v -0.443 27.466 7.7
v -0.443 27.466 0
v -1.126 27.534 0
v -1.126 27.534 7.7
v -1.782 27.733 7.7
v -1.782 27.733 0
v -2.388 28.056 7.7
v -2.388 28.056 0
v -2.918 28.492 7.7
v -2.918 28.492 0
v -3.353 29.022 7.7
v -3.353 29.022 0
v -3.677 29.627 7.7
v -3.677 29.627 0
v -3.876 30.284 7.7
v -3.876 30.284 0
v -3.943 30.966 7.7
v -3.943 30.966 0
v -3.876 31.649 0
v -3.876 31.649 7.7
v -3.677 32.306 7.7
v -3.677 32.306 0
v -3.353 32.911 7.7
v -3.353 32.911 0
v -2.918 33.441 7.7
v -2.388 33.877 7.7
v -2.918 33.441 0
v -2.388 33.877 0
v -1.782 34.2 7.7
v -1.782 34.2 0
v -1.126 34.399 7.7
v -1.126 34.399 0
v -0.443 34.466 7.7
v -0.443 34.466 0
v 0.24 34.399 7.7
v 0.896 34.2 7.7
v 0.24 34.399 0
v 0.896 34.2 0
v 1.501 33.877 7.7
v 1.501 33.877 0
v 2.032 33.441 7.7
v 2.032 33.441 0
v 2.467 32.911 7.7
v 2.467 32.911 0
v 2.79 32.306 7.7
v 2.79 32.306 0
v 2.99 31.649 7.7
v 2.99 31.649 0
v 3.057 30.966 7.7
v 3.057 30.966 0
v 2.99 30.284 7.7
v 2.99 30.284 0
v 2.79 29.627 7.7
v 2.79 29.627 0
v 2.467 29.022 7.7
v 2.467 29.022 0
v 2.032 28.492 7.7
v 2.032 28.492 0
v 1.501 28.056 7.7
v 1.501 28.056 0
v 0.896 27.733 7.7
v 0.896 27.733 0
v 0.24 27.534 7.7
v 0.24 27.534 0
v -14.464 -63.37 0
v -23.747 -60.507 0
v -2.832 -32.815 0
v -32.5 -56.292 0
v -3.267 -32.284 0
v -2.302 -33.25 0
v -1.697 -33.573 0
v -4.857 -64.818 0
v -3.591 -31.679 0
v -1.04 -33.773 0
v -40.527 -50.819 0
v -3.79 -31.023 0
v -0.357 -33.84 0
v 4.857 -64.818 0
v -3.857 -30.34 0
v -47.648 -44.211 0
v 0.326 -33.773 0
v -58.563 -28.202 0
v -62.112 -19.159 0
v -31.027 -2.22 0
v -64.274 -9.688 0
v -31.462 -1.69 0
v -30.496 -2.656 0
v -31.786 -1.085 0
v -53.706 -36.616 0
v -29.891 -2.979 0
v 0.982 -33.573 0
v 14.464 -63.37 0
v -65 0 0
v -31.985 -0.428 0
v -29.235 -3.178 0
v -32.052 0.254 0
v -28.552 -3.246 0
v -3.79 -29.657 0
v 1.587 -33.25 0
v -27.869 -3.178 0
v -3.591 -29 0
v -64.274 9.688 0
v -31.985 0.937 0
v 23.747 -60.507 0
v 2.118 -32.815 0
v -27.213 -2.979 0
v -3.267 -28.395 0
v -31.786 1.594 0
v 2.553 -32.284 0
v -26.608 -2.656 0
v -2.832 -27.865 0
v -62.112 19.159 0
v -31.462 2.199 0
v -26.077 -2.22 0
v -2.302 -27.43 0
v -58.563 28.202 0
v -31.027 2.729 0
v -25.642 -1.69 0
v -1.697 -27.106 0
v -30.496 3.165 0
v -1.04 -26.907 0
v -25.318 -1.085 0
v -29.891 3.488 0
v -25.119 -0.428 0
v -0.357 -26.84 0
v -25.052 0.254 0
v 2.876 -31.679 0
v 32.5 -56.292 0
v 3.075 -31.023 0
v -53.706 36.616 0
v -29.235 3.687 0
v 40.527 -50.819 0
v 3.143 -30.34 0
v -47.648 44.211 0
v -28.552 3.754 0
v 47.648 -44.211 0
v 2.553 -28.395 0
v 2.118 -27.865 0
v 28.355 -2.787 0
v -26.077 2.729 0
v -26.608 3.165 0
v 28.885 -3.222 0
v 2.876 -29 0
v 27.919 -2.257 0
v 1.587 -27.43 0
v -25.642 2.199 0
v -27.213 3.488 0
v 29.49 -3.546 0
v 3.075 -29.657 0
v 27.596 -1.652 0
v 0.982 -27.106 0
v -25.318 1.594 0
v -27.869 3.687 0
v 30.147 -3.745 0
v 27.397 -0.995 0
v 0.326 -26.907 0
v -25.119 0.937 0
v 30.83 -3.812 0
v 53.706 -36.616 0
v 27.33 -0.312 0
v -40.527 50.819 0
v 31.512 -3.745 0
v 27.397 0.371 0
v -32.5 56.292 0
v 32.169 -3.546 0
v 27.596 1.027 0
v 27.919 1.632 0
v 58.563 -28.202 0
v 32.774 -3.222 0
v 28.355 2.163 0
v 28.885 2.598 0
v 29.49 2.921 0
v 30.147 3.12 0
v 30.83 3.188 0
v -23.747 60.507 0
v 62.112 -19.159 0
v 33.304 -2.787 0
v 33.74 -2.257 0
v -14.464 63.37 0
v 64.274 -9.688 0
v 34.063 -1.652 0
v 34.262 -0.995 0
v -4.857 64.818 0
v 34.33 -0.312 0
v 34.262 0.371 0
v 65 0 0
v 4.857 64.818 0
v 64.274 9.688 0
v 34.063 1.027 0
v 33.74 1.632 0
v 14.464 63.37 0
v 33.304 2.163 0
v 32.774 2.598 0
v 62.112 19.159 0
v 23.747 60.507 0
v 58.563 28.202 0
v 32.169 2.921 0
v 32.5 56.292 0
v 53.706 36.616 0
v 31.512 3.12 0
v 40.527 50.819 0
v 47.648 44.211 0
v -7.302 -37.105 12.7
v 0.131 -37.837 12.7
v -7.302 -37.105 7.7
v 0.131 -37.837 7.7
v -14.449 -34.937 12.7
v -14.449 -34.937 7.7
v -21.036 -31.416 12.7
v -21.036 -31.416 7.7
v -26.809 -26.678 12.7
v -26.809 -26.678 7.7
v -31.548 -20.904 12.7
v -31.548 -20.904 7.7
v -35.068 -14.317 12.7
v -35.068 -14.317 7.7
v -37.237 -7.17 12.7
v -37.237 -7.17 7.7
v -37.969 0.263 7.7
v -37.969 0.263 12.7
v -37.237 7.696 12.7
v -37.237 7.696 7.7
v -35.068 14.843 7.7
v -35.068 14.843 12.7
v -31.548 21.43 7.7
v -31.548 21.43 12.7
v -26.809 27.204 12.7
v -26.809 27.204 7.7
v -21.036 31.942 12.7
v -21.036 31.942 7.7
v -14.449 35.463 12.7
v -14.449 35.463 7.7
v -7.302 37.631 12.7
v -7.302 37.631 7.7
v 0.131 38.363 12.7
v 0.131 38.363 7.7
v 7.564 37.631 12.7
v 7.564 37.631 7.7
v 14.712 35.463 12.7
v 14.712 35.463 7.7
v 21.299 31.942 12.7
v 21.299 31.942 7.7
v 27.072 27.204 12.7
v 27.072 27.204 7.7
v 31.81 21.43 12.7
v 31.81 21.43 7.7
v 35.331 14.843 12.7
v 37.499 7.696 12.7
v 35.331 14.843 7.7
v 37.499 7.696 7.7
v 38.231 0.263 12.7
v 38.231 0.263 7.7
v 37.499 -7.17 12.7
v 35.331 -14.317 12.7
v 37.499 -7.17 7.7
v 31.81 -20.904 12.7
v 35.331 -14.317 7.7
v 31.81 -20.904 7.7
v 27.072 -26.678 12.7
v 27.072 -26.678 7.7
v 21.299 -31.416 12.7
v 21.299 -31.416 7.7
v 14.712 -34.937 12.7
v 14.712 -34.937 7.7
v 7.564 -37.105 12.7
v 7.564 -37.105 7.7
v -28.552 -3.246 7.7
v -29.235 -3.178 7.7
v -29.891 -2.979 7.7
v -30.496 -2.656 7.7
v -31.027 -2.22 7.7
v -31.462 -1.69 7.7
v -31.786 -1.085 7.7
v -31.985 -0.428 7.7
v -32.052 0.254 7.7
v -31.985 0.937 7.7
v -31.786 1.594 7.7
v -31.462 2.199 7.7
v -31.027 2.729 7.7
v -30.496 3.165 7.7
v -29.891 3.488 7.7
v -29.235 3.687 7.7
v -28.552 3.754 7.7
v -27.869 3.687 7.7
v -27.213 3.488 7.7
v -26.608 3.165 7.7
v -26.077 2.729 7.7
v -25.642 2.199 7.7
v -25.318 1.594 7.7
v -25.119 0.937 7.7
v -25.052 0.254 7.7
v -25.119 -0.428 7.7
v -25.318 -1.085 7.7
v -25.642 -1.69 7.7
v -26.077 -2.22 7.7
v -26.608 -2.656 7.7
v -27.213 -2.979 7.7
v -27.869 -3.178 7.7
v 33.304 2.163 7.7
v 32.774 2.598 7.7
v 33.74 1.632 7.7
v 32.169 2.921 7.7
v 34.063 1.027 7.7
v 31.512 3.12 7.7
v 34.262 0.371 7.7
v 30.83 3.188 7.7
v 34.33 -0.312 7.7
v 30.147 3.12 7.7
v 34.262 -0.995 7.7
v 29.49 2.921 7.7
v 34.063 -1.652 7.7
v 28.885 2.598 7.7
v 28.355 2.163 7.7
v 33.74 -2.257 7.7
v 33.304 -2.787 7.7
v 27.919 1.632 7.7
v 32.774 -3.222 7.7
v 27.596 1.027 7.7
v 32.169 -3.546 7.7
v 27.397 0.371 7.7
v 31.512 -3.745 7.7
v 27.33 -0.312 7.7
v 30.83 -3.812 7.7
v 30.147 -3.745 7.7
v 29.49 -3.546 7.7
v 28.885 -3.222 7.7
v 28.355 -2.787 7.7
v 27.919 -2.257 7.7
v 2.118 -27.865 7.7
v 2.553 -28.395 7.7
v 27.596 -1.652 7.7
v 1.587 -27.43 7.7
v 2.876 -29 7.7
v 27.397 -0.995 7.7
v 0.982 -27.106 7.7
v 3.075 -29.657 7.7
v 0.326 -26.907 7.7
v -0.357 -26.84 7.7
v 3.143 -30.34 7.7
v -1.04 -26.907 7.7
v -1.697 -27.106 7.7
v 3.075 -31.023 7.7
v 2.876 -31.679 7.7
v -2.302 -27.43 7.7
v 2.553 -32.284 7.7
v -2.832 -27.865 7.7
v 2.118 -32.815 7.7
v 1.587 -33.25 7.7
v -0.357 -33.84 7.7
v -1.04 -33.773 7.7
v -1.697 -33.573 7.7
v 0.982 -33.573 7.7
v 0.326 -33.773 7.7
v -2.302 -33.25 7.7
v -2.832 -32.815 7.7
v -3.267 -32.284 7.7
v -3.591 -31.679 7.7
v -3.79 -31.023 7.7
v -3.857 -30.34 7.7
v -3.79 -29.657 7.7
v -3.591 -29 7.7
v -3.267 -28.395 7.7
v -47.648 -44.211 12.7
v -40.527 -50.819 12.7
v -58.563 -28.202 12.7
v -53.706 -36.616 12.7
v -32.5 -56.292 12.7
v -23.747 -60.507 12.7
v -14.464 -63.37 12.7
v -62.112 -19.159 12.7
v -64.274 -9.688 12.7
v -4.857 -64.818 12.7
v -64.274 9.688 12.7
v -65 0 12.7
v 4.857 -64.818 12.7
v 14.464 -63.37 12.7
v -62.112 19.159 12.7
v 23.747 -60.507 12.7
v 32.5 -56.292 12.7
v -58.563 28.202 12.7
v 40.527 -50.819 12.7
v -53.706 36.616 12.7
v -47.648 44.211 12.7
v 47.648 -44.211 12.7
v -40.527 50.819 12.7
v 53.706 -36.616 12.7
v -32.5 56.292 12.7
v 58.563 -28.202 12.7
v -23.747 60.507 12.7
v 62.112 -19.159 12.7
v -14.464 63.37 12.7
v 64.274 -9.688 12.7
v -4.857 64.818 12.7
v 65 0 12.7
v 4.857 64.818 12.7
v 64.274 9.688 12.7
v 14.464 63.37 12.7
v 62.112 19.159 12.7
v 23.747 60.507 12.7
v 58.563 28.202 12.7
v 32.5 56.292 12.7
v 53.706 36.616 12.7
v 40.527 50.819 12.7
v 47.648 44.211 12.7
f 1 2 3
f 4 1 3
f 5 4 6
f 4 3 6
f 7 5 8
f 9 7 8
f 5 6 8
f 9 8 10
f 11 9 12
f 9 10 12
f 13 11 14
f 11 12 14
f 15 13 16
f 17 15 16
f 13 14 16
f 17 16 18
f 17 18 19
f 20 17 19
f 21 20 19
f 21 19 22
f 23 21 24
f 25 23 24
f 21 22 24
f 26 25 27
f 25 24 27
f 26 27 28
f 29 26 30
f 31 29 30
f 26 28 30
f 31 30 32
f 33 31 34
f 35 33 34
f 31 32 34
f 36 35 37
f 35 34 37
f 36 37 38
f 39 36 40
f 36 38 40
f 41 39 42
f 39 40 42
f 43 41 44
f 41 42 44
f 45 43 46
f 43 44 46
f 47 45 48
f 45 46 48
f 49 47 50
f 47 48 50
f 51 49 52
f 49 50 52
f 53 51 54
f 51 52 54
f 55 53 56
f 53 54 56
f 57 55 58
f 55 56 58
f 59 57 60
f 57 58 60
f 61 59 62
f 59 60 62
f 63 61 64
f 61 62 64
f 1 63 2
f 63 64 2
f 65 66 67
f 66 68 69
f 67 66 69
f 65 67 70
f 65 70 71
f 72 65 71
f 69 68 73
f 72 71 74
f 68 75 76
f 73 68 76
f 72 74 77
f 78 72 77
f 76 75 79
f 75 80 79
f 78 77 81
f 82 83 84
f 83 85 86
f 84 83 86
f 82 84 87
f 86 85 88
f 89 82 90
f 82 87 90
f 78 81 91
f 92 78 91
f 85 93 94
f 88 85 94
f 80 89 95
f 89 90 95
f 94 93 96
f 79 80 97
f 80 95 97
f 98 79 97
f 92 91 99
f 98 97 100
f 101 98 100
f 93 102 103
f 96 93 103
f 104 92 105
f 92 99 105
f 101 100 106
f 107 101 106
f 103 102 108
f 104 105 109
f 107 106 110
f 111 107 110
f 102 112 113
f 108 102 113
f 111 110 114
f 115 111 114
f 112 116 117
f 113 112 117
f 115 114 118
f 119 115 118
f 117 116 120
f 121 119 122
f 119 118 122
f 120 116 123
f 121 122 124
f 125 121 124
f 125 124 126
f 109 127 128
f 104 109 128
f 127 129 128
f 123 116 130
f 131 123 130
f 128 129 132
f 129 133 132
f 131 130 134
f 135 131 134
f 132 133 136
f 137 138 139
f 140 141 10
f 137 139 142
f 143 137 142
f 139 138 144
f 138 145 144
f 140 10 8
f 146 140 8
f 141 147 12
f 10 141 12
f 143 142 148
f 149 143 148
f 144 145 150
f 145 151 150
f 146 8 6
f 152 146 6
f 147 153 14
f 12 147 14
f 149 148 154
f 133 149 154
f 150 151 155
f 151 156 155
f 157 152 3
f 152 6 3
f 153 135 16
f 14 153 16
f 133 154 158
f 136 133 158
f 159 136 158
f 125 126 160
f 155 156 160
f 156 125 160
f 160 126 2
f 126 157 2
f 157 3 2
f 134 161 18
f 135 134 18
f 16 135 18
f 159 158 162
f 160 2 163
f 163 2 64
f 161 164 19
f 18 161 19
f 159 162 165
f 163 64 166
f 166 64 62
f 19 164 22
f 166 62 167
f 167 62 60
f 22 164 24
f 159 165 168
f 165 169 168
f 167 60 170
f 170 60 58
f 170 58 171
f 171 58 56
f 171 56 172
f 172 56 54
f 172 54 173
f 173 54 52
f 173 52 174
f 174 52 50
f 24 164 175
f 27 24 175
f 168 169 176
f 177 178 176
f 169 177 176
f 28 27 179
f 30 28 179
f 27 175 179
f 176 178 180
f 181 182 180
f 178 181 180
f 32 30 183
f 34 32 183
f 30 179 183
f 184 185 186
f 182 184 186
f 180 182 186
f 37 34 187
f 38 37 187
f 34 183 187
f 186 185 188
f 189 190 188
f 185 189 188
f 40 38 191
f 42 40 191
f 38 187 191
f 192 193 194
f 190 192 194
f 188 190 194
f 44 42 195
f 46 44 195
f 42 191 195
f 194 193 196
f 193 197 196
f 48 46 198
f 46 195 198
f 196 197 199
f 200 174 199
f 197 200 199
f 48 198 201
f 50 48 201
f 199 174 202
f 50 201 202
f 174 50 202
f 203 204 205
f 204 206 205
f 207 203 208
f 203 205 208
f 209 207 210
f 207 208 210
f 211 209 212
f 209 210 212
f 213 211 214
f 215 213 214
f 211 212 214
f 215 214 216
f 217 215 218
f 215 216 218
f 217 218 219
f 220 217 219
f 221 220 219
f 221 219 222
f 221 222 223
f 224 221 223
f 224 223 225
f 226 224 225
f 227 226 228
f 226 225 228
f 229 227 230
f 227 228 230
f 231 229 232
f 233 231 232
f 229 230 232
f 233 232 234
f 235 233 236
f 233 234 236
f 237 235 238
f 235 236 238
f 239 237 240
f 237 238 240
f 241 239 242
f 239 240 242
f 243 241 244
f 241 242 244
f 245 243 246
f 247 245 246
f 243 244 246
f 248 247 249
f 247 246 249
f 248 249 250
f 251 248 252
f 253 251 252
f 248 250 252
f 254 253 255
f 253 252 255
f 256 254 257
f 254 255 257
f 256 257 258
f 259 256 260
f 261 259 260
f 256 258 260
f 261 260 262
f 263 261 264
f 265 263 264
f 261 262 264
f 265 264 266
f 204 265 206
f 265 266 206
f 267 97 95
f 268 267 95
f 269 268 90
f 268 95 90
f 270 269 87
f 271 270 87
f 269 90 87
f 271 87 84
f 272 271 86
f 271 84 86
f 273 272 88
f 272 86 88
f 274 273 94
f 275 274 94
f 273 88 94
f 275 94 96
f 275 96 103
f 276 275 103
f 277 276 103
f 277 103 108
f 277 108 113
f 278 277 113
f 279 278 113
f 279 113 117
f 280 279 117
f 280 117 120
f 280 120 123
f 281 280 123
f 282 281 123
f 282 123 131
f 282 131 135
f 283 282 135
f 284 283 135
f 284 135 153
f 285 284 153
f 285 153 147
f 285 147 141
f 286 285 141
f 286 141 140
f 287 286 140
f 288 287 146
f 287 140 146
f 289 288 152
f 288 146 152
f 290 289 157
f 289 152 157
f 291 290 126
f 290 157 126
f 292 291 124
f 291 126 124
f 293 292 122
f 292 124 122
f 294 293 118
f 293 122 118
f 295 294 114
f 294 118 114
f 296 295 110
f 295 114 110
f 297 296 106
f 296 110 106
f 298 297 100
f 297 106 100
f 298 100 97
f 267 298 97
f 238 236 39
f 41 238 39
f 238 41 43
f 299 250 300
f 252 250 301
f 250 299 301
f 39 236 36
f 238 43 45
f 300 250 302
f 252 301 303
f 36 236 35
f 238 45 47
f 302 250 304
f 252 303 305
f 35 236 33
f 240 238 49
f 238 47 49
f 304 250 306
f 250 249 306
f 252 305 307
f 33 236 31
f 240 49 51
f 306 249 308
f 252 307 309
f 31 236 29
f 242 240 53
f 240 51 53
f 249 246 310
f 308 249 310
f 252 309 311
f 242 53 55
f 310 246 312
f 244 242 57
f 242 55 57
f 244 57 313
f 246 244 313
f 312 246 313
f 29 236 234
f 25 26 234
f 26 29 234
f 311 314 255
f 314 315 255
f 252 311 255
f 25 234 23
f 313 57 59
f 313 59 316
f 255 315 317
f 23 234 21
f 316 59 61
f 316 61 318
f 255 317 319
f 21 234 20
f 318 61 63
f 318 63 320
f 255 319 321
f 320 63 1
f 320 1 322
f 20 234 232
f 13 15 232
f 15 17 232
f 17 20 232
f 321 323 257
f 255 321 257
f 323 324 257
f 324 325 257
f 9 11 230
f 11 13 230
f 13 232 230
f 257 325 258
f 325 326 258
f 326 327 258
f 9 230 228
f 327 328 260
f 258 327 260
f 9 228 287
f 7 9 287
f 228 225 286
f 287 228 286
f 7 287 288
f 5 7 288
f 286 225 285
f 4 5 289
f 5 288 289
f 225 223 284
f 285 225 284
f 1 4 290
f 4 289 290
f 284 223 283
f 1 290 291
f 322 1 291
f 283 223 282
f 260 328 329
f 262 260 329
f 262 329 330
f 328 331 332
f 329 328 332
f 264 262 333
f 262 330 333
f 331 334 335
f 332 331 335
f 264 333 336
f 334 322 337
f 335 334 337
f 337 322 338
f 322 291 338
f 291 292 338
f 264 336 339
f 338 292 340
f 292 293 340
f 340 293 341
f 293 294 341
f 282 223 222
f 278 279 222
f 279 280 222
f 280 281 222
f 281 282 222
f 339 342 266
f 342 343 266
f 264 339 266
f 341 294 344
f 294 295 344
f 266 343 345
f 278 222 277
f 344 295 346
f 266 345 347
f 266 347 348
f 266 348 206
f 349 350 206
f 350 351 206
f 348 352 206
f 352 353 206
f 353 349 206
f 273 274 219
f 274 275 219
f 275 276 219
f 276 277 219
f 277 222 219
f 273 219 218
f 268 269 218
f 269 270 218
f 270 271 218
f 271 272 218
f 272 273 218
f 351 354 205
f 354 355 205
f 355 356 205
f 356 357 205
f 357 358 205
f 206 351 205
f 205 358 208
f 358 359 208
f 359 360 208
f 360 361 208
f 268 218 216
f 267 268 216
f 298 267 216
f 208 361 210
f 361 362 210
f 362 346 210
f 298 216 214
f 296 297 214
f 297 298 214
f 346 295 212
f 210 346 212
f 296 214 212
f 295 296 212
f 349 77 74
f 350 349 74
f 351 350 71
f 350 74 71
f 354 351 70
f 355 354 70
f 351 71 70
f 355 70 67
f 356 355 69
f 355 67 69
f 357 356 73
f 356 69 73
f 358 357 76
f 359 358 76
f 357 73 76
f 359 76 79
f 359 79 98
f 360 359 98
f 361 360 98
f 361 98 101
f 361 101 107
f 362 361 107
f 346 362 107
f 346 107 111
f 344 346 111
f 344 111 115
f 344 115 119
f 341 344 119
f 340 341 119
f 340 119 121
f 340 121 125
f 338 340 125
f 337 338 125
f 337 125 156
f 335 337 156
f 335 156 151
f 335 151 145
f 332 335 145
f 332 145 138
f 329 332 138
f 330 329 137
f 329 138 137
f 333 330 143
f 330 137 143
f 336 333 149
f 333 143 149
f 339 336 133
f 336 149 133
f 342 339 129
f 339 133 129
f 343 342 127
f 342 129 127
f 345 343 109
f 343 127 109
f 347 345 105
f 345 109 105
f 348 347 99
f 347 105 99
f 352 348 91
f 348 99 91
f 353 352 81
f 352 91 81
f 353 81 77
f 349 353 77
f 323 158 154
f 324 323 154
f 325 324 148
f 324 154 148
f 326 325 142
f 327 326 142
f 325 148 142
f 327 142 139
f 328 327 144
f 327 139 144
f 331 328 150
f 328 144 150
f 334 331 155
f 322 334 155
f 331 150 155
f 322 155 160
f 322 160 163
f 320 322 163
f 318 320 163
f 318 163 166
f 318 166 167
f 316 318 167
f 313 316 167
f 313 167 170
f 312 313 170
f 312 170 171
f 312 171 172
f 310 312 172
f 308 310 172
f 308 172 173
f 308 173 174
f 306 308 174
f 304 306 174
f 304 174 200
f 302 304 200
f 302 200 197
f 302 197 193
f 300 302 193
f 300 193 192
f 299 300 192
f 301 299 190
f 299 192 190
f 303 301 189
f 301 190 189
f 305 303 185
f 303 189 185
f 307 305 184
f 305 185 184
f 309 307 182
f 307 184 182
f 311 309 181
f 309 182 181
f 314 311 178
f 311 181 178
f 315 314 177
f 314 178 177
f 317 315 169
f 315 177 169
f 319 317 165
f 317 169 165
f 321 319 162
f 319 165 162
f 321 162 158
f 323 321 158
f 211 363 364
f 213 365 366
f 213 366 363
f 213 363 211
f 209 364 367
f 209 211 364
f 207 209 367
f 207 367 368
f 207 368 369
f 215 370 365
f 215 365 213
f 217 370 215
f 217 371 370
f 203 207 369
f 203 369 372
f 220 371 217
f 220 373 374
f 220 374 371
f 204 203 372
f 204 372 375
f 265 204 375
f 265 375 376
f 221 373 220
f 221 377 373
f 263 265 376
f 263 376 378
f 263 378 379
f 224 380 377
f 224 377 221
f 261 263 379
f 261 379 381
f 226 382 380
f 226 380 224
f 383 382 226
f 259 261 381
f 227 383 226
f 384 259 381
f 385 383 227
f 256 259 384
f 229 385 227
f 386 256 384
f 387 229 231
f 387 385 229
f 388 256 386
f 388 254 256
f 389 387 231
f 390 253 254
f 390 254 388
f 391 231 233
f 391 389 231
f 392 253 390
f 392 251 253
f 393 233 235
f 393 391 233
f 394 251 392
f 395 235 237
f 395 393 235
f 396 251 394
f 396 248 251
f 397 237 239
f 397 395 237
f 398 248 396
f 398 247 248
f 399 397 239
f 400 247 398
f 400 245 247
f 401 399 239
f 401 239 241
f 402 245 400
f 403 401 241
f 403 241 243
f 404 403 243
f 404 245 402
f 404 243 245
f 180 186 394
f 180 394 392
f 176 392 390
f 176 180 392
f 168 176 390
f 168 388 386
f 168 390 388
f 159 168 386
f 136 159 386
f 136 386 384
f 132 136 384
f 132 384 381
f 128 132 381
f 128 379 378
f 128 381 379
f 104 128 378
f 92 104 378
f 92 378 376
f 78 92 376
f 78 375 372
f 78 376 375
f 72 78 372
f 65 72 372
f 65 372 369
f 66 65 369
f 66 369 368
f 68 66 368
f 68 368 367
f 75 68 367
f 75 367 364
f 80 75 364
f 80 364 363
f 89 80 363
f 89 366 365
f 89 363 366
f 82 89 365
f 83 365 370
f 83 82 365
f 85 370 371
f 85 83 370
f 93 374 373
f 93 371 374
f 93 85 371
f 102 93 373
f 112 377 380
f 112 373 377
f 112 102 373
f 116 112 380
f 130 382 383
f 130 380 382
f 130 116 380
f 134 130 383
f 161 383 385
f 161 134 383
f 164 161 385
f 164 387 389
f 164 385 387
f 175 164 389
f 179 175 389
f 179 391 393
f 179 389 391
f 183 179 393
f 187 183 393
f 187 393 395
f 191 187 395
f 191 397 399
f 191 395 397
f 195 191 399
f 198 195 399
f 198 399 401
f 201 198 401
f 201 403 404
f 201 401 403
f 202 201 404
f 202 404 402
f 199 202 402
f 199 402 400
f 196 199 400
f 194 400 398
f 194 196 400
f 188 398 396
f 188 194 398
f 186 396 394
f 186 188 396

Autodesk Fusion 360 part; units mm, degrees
sketch "Sketch1" plane through (0, 0, 0) normal (0, 0, 1) x (1, 0, 0)
  circle A0 centre (0, 0) radius 65
  dimension "d1" = 130
extrude "Extrude1" add sketch "Sketch1" along normal blind 12.7
hole "Hole1" at (0.1314, 0.2629, 12.7) direction (0, 0, -1) diameter 76.2 depth 5 tip angle 180
hole "Hole2" at (-28.552, 0.2545, 7.7) direction (0, 0, -1) diameter 7 depth 7.7 tip angle 180
hole "Hole3" at (-0.3573, -30.3398, 7.7) direction (0, 0, -1) diameter 7 depth 7.7 tip angle 180
hole "Hole4" at (-0.4431, 30.9664, 7.7) direction (0, 0, -1) diameter 7 depth 7.7 tip angle 180
hole "Hole5" at (30.8296, -0.3123, 7.7) direction (0, 0, -1) diameter 7 depth 7.7 tip angle 180
sketch "Sketch2" plane through (0, 0, 0) normal (0, 0, 1) x (1, 0, 0)
sketch "Sketch3" plane through (0, 0, 12.7) normal (0, 0, 1) x (-1, 0, 0)
  circle A0 centre (-0.1314, -0.2629) radius 38.1
  circle A1 centre (0, 0) radius 65
